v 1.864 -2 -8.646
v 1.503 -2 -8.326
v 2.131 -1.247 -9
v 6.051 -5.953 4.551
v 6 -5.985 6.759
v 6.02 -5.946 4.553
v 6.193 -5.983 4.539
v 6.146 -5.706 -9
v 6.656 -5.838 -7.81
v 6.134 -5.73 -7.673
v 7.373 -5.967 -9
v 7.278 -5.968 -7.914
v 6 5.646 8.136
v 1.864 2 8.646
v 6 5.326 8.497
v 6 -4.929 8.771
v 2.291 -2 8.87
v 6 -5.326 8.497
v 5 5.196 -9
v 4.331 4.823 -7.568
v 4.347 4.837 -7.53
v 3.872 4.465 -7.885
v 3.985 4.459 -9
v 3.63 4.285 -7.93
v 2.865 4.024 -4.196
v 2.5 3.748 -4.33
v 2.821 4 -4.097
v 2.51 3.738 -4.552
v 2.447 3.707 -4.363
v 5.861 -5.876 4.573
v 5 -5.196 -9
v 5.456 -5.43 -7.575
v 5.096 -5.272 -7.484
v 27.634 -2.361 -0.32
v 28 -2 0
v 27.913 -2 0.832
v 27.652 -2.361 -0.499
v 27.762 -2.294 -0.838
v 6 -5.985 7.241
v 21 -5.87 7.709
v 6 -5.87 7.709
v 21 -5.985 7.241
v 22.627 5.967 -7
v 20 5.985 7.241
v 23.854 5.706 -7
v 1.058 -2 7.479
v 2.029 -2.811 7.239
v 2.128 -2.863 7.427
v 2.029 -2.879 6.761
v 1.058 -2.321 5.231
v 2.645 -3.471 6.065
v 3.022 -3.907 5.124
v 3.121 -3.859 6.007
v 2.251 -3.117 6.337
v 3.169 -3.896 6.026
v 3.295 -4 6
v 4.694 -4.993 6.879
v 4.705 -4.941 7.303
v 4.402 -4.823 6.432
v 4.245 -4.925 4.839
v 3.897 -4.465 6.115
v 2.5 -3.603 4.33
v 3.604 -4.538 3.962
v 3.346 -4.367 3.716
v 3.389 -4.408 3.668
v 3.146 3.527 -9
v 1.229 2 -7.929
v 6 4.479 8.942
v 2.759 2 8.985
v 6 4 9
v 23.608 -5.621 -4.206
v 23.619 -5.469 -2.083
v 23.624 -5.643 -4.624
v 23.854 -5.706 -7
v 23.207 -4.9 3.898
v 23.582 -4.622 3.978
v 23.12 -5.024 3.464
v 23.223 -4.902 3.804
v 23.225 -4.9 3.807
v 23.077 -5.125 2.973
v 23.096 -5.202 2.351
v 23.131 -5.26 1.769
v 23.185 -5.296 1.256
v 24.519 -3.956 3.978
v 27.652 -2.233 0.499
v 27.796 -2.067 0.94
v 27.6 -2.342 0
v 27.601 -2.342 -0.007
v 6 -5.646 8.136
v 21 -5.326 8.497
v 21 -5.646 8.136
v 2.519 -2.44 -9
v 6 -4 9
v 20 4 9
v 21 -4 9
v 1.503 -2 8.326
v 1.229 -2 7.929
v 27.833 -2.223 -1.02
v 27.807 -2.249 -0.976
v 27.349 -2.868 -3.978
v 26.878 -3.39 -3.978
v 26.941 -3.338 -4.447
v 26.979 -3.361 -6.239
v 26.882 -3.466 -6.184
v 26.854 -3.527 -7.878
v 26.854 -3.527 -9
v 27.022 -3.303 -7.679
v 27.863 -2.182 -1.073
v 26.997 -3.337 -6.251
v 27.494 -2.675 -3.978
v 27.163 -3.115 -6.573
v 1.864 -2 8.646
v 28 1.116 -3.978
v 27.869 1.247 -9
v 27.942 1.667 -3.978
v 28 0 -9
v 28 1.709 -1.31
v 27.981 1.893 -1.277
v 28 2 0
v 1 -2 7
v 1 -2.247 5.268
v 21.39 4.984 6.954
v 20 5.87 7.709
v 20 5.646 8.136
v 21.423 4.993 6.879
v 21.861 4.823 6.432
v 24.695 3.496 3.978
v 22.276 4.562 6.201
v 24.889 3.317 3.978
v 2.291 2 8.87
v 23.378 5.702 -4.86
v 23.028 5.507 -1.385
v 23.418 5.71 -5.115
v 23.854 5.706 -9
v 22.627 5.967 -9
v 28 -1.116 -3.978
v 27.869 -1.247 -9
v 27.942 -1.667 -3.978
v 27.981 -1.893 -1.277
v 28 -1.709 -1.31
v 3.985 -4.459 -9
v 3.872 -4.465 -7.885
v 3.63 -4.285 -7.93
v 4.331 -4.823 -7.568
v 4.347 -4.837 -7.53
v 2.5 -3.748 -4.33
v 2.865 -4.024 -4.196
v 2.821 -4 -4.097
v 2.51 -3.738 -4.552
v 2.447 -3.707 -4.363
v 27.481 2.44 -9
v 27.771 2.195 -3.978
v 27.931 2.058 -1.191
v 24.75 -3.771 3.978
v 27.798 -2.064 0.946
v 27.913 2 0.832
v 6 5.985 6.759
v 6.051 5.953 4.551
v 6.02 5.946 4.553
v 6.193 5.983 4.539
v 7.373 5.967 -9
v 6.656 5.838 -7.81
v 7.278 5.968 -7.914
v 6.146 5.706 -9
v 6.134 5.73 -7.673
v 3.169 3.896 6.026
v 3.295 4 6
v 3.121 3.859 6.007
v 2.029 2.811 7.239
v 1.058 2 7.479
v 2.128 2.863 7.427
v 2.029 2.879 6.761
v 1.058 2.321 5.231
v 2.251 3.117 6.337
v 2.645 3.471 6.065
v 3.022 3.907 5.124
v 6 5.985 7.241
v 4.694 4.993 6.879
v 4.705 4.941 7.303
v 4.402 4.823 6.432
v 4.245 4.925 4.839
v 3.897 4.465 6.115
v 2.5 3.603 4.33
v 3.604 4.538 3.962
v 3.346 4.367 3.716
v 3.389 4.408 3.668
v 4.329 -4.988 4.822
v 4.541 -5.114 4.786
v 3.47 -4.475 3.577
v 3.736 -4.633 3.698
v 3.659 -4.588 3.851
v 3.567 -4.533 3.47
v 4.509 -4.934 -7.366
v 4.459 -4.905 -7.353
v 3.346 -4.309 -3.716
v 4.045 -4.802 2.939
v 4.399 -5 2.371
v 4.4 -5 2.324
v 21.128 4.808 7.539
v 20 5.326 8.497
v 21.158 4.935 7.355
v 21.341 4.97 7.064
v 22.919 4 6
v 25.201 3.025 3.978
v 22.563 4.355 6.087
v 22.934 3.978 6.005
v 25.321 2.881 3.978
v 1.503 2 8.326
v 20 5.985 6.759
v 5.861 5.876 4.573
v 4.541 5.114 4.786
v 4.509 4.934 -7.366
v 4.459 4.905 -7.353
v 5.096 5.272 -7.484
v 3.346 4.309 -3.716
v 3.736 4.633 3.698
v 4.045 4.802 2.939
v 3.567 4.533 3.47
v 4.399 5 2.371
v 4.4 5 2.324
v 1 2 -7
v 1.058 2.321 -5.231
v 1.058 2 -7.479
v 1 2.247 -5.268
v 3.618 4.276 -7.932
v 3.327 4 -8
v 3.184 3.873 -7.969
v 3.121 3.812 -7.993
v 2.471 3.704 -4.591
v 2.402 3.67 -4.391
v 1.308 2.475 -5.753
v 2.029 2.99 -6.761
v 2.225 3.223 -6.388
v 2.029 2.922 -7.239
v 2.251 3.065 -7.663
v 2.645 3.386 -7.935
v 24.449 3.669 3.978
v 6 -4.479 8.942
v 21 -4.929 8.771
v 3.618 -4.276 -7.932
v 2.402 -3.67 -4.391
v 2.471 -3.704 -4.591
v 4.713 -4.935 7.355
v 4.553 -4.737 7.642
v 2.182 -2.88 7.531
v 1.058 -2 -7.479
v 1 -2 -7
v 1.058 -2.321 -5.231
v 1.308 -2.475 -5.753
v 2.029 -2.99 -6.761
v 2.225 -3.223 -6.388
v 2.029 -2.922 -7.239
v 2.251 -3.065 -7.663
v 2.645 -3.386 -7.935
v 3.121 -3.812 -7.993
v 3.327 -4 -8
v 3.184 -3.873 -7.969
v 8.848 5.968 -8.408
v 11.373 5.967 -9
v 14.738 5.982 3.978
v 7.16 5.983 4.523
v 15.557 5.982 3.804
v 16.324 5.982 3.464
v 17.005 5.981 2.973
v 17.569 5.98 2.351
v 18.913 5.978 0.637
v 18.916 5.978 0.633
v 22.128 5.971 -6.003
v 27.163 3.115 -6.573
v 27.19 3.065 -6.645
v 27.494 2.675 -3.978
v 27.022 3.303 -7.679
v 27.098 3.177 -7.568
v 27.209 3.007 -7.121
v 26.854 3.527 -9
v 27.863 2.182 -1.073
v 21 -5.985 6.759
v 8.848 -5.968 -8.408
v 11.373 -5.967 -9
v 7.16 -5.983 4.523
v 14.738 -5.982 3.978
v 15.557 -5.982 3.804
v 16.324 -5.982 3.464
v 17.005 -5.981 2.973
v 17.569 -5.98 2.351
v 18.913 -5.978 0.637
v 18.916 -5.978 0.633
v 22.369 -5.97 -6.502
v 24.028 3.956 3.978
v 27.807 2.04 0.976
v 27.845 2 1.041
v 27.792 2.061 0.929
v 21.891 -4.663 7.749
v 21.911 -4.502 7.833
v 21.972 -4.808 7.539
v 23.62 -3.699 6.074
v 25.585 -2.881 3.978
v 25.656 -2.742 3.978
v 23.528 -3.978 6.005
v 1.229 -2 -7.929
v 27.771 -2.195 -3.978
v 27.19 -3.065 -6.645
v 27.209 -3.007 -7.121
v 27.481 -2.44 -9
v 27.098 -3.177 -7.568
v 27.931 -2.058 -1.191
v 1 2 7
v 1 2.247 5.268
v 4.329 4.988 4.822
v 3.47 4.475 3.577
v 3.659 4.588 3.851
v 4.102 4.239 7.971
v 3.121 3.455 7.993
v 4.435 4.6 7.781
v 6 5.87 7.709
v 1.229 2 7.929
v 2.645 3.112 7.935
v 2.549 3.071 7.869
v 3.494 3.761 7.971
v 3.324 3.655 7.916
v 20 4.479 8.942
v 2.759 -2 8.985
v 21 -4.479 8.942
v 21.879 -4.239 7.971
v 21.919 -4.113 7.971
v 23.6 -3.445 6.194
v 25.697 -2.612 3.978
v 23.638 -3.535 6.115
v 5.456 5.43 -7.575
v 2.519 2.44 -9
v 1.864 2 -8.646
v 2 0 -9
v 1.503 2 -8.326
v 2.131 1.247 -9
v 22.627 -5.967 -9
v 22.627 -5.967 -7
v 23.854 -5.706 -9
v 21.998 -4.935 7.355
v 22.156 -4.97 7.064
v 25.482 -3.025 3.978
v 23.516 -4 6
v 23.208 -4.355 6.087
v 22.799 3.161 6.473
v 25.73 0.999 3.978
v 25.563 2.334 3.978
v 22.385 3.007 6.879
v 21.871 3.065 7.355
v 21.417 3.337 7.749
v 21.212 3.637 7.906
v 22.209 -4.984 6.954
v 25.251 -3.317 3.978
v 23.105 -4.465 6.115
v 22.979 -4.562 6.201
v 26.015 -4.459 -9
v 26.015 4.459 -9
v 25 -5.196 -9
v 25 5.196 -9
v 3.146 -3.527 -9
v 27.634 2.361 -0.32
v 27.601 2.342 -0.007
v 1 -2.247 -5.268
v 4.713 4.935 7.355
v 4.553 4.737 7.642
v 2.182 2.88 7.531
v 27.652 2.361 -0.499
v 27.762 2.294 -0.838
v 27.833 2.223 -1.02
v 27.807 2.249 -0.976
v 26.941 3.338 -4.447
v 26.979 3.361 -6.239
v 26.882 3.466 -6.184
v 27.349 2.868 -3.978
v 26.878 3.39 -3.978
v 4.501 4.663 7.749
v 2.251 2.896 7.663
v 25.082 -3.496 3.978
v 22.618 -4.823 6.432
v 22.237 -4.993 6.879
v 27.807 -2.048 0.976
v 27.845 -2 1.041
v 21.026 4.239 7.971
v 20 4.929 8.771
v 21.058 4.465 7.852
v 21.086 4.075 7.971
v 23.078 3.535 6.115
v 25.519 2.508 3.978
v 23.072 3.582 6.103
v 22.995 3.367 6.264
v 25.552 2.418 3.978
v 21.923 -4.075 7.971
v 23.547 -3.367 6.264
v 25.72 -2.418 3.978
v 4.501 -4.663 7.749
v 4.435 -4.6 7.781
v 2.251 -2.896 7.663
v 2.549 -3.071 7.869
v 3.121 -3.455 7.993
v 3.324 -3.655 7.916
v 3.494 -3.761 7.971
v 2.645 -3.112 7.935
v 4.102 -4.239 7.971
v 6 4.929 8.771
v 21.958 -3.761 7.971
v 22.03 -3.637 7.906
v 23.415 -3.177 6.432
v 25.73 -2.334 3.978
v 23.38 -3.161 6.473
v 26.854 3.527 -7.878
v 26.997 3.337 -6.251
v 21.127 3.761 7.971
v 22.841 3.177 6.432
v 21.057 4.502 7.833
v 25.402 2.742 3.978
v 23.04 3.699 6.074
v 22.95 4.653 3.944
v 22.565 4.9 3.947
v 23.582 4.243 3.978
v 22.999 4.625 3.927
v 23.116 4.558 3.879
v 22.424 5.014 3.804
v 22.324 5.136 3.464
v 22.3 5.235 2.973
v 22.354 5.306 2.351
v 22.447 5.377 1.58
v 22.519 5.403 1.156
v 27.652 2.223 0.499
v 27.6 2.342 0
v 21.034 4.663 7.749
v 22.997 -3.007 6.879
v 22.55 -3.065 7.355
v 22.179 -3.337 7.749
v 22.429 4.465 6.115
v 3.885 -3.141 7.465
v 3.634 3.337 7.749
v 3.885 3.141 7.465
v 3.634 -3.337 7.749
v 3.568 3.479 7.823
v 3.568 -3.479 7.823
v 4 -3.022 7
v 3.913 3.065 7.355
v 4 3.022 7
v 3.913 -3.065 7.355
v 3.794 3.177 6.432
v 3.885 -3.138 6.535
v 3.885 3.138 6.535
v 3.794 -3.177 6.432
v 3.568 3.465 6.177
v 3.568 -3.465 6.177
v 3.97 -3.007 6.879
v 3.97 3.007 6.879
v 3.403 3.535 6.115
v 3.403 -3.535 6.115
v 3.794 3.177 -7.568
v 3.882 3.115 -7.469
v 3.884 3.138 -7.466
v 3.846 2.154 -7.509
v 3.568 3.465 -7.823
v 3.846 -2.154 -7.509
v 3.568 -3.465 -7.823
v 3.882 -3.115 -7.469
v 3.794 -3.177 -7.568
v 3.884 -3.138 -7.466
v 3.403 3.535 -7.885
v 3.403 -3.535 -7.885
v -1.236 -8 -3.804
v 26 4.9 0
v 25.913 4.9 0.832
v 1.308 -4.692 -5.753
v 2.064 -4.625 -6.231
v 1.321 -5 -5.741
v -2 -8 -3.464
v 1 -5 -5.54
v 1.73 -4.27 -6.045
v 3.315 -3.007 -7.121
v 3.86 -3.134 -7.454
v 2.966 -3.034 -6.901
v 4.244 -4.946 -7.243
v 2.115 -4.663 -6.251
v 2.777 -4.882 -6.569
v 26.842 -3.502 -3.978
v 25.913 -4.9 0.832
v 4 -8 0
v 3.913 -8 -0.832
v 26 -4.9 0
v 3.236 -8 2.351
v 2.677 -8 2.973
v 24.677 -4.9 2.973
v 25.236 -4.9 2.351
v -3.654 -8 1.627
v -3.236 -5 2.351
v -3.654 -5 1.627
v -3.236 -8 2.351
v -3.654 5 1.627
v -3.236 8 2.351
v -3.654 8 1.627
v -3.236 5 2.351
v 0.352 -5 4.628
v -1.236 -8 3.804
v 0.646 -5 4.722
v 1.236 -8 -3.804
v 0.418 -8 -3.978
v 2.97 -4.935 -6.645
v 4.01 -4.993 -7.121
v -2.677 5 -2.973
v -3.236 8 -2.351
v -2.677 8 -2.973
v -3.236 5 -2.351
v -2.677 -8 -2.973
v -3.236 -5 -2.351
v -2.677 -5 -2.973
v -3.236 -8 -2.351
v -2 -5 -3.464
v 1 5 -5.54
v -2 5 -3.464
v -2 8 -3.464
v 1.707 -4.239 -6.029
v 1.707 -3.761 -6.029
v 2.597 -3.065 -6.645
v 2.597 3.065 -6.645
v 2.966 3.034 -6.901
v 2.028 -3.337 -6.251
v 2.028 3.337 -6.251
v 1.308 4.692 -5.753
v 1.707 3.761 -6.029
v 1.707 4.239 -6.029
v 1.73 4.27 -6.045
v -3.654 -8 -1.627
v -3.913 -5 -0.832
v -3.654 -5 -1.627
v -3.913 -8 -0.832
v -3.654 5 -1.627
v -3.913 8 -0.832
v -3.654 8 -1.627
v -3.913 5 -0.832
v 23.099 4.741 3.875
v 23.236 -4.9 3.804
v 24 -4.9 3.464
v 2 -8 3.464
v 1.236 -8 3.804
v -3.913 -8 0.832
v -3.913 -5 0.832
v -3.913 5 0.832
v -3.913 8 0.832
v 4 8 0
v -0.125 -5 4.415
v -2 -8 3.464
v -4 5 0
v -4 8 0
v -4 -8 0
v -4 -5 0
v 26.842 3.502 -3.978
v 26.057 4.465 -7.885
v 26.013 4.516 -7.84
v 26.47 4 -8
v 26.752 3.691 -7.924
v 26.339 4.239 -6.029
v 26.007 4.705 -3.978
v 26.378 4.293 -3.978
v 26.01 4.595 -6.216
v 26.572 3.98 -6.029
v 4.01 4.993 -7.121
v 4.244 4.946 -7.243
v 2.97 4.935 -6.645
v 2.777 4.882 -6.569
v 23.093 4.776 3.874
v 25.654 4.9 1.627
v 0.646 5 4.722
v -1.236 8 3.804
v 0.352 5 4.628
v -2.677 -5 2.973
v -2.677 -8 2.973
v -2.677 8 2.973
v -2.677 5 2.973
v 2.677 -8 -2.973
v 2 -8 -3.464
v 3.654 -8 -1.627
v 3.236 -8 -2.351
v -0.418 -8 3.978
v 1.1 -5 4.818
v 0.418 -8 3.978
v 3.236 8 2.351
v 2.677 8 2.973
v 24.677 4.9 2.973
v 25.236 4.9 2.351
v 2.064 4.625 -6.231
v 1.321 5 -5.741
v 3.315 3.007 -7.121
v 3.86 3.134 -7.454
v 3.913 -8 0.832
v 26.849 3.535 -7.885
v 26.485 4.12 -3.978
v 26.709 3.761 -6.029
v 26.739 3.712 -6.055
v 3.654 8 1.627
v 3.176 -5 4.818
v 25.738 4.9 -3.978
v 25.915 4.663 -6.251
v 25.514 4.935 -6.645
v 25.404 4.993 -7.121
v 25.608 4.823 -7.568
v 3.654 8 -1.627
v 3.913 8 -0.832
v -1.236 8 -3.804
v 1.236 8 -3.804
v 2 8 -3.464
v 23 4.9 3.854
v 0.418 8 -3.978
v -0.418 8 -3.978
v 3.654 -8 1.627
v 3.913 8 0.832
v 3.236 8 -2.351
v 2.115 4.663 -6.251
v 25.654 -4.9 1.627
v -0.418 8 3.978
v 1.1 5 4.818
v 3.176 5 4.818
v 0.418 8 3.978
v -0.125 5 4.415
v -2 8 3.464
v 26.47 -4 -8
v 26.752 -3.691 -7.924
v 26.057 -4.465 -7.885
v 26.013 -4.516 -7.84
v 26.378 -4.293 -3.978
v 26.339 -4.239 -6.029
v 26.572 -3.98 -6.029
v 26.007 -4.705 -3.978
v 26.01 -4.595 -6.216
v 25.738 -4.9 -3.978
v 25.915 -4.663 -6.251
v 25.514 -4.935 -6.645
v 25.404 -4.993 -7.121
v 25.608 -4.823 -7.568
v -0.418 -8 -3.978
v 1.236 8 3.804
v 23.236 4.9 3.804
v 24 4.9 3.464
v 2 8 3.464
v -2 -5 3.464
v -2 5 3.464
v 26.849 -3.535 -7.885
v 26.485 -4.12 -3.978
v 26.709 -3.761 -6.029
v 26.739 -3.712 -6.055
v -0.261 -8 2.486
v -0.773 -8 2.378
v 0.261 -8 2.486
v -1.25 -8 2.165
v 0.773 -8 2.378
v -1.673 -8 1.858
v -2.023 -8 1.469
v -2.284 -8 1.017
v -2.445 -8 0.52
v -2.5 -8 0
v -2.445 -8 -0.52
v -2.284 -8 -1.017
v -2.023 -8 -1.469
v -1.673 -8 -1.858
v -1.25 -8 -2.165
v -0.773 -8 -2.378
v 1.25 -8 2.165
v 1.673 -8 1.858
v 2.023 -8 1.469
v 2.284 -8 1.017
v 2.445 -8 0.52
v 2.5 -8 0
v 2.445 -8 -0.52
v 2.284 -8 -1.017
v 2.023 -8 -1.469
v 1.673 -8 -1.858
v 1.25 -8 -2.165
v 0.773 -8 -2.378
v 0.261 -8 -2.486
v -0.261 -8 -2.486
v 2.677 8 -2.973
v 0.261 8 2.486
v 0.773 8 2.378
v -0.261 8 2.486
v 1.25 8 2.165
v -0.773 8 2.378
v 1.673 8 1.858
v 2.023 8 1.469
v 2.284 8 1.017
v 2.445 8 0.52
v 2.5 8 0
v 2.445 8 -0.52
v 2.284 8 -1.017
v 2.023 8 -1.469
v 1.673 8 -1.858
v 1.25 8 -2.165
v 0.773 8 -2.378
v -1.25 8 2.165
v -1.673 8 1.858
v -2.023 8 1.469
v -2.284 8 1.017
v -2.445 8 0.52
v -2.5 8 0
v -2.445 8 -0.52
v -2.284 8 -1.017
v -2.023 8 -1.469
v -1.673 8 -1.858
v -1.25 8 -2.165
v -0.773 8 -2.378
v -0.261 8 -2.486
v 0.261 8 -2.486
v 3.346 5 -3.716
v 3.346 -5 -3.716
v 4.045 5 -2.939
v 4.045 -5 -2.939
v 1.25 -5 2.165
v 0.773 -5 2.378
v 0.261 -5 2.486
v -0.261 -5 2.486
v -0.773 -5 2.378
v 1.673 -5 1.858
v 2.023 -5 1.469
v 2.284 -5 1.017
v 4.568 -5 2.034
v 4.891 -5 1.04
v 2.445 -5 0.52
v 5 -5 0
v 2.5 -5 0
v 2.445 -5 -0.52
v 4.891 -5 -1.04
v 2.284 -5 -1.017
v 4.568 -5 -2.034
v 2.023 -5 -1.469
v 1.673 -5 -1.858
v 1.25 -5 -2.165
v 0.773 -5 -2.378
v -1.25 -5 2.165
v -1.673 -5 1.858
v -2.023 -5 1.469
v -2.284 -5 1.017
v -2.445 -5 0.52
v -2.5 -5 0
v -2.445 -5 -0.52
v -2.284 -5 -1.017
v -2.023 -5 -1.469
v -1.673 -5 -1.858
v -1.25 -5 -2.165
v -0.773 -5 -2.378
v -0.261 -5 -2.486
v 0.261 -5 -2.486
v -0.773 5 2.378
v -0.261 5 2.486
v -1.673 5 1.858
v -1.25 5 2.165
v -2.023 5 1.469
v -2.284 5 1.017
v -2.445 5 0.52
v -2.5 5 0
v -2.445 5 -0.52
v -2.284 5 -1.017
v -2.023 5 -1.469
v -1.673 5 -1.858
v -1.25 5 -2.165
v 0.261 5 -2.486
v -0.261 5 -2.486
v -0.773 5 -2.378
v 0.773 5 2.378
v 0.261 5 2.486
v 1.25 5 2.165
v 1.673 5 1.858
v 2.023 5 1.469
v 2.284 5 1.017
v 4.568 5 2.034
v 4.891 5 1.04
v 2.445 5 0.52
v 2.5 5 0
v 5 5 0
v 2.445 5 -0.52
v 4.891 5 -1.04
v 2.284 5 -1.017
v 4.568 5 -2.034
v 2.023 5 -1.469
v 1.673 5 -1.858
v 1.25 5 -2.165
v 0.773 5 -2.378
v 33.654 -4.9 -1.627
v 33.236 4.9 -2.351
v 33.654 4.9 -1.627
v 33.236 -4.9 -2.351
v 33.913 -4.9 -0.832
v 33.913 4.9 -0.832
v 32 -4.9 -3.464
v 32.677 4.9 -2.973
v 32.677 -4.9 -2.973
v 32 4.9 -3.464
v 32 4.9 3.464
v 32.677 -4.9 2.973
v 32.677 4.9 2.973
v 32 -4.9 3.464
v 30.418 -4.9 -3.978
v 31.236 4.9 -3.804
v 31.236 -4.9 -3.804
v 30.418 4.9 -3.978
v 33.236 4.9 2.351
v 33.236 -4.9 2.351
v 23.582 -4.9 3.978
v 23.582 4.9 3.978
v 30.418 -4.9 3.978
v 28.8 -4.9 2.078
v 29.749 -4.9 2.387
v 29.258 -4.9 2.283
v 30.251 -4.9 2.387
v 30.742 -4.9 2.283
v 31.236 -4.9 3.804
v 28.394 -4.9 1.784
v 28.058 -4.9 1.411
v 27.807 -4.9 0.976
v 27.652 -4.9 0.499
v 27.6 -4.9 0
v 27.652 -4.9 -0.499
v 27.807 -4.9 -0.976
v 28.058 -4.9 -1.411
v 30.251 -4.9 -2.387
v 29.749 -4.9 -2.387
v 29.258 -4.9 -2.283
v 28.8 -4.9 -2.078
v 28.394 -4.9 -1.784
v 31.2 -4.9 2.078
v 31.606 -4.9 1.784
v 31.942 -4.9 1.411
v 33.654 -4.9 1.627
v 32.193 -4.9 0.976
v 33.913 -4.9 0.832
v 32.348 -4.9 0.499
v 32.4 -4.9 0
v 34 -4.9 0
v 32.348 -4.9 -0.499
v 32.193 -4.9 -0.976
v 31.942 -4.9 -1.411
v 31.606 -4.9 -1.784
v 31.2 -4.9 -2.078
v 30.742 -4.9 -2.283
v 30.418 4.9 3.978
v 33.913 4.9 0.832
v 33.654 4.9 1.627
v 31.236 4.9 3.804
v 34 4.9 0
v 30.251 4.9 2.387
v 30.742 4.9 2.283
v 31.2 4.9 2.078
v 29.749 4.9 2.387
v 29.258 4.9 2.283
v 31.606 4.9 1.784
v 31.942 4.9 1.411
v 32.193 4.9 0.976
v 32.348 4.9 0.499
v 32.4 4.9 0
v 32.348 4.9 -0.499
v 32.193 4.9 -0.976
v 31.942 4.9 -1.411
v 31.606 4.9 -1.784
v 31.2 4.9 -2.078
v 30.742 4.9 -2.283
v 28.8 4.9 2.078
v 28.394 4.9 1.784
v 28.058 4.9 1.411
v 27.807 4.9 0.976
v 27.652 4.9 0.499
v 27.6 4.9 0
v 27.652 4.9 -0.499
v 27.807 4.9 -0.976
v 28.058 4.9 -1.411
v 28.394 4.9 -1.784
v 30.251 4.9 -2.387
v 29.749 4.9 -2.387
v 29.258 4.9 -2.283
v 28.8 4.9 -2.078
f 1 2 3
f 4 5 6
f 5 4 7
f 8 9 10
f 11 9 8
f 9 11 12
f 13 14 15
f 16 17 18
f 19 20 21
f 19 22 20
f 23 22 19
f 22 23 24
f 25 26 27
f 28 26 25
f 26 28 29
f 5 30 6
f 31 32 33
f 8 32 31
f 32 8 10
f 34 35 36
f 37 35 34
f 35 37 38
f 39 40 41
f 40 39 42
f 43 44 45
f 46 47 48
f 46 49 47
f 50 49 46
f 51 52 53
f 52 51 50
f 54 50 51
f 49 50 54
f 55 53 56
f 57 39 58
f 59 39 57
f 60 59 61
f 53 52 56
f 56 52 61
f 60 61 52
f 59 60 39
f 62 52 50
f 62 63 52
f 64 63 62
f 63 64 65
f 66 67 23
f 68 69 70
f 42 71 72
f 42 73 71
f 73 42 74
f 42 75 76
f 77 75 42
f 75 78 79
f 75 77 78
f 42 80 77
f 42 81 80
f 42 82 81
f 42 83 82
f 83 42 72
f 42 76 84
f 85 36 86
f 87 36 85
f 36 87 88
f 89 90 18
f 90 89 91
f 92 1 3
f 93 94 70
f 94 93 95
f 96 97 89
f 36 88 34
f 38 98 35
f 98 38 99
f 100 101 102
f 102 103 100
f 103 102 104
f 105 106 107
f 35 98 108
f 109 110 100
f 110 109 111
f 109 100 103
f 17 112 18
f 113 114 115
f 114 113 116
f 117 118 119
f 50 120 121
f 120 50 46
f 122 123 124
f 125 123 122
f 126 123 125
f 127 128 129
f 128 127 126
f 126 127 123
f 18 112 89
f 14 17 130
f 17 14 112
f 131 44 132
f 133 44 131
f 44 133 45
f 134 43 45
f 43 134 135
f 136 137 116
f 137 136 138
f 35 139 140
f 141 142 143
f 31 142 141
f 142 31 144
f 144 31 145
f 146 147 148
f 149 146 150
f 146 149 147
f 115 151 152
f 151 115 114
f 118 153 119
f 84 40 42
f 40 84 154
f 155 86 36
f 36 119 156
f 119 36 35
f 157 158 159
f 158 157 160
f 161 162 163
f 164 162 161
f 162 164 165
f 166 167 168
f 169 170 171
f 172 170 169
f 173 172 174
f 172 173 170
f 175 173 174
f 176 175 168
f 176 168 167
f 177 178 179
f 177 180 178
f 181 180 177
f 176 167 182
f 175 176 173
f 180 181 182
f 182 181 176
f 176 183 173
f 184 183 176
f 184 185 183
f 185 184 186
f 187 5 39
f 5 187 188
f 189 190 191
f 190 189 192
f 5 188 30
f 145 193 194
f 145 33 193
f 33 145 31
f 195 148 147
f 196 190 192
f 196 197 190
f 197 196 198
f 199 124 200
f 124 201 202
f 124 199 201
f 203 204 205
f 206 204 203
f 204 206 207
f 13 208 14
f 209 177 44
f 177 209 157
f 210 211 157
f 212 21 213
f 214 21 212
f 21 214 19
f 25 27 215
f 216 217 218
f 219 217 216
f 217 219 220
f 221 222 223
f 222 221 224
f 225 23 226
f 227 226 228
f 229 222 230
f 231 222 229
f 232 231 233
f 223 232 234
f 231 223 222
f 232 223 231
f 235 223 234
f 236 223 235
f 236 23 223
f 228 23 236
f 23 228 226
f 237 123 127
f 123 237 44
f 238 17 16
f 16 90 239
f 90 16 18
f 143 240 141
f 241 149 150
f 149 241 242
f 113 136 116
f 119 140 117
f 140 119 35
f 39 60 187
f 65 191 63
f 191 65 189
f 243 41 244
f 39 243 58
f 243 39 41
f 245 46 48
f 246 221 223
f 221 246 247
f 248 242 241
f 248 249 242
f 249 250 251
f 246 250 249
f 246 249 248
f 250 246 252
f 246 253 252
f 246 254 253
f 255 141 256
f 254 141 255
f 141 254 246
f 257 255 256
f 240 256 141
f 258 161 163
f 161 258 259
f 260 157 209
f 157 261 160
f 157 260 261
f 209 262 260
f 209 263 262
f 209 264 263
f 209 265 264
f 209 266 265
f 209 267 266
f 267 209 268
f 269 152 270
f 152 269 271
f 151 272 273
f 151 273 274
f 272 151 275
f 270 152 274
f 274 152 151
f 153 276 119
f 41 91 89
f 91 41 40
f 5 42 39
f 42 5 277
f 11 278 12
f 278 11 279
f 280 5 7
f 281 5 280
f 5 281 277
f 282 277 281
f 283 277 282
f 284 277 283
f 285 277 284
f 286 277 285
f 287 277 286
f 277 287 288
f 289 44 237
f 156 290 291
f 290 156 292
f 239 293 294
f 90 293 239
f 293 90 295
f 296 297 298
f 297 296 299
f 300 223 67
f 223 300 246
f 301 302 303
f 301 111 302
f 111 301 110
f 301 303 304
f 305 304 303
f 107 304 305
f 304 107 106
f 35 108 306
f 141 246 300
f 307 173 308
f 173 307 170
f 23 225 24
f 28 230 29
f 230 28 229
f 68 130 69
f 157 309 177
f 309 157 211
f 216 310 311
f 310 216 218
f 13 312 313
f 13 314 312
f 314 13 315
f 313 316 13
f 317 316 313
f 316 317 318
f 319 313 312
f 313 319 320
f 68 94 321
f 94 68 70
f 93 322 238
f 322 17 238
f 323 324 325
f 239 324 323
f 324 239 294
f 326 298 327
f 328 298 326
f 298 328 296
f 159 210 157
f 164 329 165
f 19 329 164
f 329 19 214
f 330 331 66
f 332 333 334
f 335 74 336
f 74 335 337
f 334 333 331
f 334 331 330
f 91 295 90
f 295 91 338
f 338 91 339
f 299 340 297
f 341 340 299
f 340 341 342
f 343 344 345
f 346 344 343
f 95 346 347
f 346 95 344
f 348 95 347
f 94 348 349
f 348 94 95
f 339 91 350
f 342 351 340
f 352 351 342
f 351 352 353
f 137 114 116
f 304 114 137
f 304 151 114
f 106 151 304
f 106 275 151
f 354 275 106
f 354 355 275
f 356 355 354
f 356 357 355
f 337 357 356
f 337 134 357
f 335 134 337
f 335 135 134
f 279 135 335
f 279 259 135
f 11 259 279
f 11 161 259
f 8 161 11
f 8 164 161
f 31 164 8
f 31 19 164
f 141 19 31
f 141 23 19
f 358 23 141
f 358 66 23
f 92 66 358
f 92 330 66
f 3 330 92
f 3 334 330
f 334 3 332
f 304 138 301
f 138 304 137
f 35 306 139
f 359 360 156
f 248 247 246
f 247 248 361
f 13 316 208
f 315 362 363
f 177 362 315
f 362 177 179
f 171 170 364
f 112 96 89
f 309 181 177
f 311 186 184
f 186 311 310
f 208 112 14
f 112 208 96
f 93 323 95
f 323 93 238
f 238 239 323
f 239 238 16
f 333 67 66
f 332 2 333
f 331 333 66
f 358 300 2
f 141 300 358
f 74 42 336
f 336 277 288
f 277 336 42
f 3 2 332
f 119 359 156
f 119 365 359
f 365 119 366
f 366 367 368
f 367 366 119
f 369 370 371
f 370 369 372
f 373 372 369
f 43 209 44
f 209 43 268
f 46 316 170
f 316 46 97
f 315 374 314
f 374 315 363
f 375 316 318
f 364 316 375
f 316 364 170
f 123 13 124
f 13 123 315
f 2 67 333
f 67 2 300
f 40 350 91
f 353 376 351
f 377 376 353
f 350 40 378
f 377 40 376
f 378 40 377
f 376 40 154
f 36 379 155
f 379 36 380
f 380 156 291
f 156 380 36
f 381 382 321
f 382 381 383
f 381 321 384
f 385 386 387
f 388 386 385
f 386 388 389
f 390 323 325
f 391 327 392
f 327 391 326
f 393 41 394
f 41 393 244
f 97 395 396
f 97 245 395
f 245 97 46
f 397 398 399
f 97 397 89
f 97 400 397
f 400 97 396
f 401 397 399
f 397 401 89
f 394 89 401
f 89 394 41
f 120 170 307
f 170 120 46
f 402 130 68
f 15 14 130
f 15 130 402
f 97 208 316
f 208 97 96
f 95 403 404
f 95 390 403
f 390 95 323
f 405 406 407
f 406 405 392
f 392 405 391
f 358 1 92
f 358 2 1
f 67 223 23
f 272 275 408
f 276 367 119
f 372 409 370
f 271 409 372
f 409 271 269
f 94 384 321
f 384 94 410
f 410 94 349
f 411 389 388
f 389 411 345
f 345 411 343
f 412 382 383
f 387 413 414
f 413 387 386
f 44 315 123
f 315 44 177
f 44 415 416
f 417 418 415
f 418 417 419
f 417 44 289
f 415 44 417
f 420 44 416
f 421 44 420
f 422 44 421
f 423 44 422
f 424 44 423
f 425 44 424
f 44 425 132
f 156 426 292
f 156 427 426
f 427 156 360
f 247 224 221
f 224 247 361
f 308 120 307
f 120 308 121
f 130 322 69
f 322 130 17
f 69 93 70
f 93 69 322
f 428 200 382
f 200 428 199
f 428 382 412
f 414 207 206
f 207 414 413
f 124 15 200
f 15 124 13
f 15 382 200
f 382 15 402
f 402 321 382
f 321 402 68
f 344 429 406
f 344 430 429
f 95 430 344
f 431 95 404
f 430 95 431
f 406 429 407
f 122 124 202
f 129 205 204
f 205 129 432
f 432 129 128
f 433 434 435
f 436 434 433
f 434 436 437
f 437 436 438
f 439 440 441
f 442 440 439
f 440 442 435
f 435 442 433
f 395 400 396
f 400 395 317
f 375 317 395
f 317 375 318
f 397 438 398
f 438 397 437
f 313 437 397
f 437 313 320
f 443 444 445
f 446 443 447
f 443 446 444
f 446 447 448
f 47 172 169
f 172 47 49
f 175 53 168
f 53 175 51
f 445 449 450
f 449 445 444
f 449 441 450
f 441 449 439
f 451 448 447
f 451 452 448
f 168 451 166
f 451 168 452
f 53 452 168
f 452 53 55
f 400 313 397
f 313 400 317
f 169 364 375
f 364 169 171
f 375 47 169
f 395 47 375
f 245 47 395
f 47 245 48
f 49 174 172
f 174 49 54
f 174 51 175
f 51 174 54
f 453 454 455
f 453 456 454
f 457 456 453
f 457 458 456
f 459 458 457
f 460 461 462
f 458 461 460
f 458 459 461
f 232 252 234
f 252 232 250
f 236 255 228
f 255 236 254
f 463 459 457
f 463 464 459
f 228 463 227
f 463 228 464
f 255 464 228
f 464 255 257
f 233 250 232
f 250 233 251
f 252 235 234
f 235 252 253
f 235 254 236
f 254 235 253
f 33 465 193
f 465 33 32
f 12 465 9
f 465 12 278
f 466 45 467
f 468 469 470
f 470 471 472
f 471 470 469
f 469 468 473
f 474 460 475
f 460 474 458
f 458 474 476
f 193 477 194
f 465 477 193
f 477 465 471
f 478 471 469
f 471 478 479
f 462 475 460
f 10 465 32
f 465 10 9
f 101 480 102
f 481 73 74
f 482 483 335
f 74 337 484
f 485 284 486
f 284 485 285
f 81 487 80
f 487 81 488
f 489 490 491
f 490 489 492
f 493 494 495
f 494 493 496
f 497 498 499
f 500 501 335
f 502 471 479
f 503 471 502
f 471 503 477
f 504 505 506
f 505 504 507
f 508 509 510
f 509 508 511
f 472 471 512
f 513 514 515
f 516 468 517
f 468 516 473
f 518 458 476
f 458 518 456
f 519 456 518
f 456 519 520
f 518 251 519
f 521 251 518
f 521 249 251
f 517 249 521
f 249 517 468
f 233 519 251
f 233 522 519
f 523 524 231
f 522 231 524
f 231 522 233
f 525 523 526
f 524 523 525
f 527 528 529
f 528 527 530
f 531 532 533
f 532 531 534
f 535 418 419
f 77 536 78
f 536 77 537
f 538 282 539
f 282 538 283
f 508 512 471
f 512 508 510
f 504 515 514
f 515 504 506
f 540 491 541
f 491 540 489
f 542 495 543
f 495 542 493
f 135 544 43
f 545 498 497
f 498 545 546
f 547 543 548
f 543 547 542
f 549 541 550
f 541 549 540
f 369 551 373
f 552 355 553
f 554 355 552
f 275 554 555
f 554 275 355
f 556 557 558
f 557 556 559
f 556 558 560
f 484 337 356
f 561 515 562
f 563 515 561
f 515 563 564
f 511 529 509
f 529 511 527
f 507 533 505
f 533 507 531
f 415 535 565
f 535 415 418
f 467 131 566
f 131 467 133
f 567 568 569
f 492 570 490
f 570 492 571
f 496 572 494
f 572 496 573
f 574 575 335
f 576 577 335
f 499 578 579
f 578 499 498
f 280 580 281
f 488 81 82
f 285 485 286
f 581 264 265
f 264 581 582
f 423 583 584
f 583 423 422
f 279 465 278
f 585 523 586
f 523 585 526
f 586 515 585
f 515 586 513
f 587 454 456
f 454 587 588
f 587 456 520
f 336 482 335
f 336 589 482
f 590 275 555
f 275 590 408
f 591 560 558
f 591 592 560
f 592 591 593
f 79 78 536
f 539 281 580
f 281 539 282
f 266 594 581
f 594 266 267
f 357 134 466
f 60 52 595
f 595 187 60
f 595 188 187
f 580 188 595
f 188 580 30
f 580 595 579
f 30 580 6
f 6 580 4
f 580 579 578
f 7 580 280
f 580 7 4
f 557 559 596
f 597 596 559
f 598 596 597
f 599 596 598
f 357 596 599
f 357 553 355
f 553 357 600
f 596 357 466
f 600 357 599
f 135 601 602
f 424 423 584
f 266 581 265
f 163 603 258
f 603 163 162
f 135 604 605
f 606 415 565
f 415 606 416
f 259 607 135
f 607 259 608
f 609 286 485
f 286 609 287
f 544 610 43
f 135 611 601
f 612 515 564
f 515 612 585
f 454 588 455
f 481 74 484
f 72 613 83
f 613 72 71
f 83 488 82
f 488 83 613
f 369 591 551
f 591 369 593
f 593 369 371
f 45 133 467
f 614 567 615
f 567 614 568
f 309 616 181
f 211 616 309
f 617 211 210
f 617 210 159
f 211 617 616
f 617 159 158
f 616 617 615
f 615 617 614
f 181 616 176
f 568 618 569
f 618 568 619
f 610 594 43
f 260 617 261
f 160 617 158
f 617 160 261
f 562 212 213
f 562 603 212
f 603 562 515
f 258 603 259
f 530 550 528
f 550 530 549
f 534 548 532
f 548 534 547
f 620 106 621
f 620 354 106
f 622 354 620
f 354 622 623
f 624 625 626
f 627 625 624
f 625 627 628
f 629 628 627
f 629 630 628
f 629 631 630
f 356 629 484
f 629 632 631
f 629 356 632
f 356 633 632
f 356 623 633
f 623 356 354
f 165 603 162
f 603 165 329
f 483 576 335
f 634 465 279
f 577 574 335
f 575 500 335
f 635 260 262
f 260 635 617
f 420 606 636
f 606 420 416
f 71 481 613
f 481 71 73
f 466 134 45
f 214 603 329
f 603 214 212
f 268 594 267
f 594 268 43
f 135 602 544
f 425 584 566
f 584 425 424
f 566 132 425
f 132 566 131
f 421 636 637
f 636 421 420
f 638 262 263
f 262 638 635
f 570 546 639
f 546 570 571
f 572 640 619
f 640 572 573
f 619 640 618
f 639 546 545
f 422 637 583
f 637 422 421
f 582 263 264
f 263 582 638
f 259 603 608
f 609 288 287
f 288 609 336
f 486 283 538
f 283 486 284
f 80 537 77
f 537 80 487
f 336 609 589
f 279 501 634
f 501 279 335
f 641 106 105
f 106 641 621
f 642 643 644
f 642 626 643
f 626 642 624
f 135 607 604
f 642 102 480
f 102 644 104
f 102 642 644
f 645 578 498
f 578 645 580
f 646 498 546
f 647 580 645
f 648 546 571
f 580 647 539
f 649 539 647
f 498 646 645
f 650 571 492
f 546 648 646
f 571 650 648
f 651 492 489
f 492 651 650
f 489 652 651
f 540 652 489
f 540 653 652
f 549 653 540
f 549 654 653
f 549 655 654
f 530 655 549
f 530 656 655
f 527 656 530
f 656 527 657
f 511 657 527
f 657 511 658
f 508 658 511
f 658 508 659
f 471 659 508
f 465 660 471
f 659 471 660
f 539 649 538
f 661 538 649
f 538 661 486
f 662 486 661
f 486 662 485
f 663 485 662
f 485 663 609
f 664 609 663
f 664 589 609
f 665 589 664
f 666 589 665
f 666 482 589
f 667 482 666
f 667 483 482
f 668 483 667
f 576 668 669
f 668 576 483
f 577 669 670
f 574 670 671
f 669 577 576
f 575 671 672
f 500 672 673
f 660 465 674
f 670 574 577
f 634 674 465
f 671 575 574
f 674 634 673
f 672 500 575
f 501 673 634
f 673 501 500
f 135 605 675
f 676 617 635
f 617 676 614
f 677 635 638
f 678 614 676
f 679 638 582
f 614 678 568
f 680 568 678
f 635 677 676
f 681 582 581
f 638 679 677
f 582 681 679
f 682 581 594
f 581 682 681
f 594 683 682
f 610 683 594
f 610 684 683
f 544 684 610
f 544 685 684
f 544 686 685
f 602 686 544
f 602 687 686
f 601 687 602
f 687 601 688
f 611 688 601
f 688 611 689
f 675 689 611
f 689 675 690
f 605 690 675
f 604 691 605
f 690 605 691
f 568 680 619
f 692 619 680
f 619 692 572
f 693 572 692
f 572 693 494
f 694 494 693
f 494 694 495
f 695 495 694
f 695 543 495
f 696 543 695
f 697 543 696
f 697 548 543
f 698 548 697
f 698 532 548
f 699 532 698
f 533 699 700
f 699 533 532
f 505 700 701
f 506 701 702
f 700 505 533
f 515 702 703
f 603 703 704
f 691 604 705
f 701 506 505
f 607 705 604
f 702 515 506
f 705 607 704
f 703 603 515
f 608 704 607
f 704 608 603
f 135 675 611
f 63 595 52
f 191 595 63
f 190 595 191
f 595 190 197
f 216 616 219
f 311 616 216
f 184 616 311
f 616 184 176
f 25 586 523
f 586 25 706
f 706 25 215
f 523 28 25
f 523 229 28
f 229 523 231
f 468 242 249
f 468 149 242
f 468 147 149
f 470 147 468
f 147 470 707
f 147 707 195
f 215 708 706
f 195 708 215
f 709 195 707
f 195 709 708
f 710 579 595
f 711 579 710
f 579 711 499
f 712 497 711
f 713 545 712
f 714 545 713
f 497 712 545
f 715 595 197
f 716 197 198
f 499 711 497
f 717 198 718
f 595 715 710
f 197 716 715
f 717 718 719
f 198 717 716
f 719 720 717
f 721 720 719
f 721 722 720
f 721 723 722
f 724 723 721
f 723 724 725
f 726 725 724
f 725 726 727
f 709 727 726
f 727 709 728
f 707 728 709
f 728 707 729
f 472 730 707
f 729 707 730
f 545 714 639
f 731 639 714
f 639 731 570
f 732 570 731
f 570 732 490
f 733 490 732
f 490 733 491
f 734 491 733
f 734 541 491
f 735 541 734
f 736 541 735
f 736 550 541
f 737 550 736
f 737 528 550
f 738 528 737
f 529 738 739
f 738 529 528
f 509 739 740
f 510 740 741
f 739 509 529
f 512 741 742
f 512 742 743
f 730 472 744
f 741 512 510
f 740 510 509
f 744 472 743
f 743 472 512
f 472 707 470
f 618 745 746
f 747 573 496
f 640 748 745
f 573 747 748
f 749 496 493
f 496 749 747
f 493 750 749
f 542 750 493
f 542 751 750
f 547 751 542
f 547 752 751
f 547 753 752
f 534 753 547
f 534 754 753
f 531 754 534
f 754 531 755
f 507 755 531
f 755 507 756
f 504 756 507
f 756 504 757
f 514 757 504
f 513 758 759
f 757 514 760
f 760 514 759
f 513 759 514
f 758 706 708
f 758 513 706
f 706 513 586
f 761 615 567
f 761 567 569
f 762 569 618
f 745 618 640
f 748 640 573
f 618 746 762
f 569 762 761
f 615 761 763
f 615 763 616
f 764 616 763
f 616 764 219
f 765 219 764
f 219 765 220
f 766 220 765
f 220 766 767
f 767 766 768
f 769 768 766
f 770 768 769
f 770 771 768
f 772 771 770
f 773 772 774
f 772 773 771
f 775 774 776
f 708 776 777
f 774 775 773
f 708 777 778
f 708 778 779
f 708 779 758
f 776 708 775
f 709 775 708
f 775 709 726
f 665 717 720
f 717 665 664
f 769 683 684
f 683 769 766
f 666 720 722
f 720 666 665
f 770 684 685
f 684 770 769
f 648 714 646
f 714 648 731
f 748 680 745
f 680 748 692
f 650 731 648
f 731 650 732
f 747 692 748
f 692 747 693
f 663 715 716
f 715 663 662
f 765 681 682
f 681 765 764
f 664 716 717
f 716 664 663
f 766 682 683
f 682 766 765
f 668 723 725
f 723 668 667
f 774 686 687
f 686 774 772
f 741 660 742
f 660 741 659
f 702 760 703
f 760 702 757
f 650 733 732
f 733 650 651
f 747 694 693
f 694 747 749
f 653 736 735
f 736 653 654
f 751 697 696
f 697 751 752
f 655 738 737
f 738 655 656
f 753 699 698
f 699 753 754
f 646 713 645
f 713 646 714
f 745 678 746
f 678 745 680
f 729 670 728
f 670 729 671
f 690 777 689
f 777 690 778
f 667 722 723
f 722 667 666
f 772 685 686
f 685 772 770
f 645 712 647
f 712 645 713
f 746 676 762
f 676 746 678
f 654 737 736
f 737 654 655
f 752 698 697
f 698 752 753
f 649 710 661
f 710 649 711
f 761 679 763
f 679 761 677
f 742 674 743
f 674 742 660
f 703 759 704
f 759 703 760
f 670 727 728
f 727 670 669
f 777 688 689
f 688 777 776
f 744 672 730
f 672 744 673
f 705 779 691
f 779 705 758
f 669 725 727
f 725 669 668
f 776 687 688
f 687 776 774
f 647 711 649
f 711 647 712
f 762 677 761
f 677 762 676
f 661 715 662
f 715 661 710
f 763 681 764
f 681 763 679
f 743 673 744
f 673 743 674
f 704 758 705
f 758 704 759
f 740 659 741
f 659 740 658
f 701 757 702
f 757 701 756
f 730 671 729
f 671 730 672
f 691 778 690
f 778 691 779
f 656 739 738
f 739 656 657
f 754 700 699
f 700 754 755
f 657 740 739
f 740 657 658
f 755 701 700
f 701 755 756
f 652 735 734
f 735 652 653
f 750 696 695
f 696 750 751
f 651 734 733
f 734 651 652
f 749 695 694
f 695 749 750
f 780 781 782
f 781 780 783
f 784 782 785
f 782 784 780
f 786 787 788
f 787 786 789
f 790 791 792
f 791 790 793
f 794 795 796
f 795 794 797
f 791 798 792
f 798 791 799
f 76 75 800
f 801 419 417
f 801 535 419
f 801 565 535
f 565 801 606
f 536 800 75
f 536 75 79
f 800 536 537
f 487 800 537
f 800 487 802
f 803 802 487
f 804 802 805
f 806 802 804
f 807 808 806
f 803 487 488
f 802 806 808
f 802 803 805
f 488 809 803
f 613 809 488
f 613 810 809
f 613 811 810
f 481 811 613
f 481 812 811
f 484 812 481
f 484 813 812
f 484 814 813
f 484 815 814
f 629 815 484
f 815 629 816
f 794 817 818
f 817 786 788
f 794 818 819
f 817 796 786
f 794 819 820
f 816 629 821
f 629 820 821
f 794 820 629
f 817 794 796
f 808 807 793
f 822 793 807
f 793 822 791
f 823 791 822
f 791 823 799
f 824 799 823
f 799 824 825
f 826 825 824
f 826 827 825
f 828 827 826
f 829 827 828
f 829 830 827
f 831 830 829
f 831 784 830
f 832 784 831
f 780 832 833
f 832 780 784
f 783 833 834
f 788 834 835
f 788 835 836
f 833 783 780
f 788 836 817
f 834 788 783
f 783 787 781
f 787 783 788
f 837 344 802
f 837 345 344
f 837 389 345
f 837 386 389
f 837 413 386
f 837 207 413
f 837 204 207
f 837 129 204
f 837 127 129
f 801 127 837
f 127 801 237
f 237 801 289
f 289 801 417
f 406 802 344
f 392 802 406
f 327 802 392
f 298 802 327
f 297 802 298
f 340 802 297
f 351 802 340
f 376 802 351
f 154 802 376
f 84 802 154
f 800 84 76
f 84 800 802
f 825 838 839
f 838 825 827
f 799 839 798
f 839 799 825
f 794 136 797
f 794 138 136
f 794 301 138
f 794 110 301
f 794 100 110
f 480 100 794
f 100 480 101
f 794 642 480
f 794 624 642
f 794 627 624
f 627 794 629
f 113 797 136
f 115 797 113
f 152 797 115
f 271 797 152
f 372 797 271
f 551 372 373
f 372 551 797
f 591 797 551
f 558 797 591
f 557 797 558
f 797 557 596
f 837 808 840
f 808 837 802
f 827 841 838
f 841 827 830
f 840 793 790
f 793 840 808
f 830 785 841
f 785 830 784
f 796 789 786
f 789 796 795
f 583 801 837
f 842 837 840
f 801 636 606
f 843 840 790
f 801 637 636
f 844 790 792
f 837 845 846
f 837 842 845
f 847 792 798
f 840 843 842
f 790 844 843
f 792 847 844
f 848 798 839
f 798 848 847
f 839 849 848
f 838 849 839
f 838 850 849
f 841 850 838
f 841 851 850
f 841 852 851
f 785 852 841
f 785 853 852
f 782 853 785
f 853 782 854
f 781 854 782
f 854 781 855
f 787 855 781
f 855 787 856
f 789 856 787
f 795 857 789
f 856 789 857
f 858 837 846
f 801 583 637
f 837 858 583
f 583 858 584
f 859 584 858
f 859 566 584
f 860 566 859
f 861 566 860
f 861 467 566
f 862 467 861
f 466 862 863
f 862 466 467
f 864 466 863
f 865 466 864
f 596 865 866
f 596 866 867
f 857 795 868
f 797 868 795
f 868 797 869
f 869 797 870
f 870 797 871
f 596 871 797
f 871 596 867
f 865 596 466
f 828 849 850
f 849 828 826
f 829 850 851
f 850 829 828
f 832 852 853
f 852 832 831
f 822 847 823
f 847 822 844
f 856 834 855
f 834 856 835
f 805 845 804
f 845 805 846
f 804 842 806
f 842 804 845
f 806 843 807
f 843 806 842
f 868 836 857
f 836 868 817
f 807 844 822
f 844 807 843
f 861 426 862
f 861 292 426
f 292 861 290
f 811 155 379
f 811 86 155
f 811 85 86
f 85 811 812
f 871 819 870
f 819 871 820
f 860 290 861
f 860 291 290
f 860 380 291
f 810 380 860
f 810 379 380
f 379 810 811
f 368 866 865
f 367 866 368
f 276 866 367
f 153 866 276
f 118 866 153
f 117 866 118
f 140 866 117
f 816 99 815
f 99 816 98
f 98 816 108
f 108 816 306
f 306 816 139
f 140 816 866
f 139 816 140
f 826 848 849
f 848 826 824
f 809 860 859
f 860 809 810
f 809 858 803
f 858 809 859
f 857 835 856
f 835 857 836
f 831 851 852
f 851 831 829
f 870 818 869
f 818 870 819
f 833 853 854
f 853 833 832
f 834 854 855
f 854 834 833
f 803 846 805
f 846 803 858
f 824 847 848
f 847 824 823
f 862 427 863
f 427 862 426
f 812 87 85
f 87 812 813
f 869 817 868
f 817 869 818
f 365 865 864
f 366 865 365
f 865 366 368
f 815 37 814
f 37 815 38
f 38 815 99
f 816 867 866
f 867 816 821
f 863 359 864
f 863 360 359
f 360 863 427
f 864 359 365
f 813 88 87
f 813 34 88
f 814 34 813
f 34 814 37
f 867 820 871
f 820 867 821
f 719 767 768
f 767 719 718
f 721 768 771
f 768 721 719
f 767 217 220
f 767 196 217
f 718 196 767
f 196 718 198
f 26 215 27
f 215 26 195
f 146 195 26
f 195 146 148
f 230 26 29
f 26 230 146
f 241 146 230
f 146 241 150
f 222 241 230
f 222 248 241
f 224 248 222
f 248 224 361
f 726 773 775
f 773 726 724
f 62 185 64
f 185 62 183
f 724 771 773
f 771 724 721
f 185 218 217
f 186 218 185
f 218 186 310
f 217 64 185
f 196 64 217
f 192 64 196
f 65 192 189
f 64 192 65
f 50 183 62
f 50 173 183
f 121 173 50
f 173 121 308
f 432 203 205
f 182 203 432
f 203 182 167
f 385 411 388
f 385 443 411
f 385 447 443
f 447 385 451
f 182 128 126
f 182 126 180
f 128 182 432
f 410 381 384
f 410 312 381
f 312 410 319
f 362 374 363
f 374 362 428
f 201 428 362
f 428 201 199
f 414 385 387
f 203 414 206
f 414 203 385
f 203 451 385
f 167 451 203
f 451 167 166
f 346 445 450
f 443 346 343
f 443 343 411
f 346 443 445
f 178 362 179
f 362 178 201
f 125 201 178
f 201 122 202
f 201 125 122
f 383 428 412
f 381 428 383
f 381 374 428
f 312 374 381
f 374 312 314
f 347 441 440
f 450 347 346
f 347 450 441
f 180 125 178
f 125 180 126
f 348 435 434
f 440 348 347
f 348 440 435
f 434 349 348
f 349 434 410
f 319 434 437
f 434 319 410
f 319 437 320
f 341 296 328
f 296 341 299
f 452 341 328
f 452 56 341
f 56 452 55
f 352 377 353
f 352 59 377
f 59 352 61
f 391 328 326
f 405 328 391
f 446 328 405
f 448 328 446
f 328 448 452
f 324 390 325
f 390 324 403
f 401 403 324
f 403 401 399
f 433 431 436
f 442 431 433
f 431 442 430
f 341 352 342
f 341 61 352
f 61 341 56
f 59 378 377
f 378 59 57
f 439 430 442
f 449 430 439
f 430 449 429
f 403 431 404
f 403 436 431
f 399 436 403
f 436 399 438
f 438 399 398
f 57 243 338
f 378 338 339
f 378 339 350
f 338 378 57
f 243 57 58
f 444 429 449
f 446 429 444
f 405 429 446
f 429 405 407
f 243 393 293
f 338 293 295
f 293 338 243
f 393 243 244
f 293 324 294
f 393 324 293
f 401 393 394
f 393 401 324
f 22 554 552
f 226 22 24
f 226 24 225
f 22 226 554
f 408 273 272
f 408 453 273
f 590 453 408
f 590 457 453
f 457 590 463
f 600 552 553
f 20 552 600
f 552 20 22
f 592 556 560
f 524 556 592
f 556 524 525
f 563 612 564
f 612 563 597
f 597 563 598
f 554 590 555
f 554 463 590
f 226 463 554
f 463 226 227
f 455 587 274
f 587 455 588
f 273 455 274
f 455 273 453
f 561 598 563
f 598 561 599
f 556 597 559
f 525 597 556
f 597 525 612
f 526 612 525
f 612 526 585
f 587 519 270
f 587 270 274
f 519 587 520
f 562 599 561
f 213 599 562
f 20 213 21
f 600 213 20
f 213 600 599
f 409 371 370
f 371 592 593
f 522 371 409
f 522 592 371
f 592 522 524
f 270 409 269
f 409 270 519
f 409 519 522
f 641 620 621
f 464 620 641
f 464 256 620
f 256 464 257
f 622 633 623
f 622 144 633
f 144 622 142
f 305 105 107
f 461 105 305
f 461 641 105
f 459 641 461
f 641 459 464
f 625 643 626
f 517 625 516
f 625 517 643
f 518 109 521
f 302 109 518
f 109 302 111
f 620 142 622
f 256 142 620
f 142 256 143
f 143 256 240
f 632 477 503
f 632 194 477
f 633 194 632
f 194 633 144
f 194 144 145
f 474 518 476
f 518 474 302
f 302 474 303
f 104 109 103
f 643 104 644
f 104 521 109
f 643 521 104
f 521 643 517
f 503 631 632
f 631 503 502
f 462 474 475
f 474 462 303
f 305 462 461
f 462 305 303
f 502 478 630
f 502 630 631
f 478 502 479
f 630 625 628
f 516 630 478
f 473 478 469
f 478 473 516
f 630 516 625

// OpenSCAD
// file: ../modules/foot-common-parts.scad
module jointUpper() {
    difference() {
        hull() {
            children();
            rotate([90,0,0])
            translate([0,0,-8])
            cylinder(r=4,h=16); 
        }
         hull(){
            rotate([90,0,0]) {
                translate([0,0,-5])
                cylinder(h=10,r=5);
                translate([-5,10,-5])
                cylinder(h=10,r=5);

                translate([-5,-5,-5])
                cylinder(h=10,r=5);

            }
        }
        rotate([90,0,0])
        translate([0,0,-10]){
            cylinder(h=20,r=2.5);
        }
    }
}

module jointLower(x) {
    difference() {
    hull() {
                rotate([90,0,0])
                translate([x,0,-4.9])
                cylinder(h=9.8,r=4);
                
                rotate([90,0,0])
                translate([x-6,0,-4.9])
                cylinder(h=9.8,r=4);
                
                
            }
            rotate([90,0,0])
            translate([x,0,-8])
            cylinder(h=16,r=2.4);
        }
}

//creates a cylinder from [x1,y1,z1] to [x2,y2,z2] with radius r
module pointCylinder(x1,y1,z1,x2,y2,z2,r, extend=false) {
    x= x2-x1;
    y= y2-y1;
    z= z2-z1;
    
    x_vect = [y,-x,0]; // = cross([x,y,z],[0,0,1])

    y_vect = cross([x,y,z],x_vect);

    m = [
    [y/norm(x_vect),y_vect[0]/norm(y_vect),x,x1],
    [-x/norm(x_vect),y_vect[1]/ norm(y_vect),y,y1],
    [0,y_vect[2]/ norm(y_vect),z,z1],
    [0,0,0,1]
    ];

    multmatrix(m)
    if (extend){
        translate([0,0,-1])
        cylinder(r=r,h=3);
        }
    else 
    {cylinder(r=r,h=1);}
}

 module offset_3d(r=1, size=1000) {
     n = $fn==undef ? 12: $fn;
     if(r==0) children();
     else 
         if( r>0 )
             minkowski(convexity=5){
                 children();
                 sphere(r, $fn=n);
             }
         else {
             size2 = size*[1,1,1];// this will form the positv
             size1 = size2*2;    // this will hold a negative inside
             difference(){
                 cube(size2, center=true);// forms the positiv by substracting the negative
                 minkowski(convexity=5){
                     difference(){
                         cube(size1, center=true);
                         children();
                     }
                     sphere(-r, $fn=n);
                 }
             }
         }
 }

module tendonTube (x1,y1,z1,x2,y2,z2,smooth=true) {
    difference() {
        
            hull() {
            pointCylinder(x1,y1,z1,x2,y2,z2,2);
            children();
            
            }
            if (smooth) {
                difference() {
                    pointCylinder(x1,y1,z1,x2,y2,z2,1.5, true);
                    offset_3d(0.5)
                    offset_3d(-0.5)
                    difference(){
                        hull(){
                            pointCylinder(x1,y1,z1,x2,y2,z2,2);
                            children();
                        }
                        pointCylinder(x1,y1,z1,x2,y2,z2,1, true);
                    }    
               }
           }
           else {
               pointCylinder(x1,y1,z1,x2,y2,z2,1, true);
           }
        }
    }
    
module tendonAttachments (x1,z1,x2,z2) {
    difference() {
        hull() {
            children();
            translate([x1,0,z1])
            rotate([90,0,0])
            translate([0,0,-2])
            cylinder(r=2,h=4); 
            translate([x2,0,z2])
            rotate([90,0,0])
            translate([0,0,-2])
            cylinder(r=2,h=4);            
        }
        translate([x1,0,z1])
        rotate([90,0,0])
        translate([0,0,-10])
        cylinder(h=20,r=1);
        
        translate([x2,0,z2])
        rotate([90,0,0])
        translate([0,0,-10])
        cylinder(h=20,r=1);
    }
}
// main file
$fs = 0.5;
//use <phalanx2.scad>
use <../modules/foot-common-parts.scad>

module phalanx1() {
    difference() {
        union() {
            tendonAttachments(3,7,3,-7) {
                translate([15,0,0])
                rotate([90,0,0])
                translate([0,0,-3])
                cylinder(r=2,h=6);
                
                translate([3,0,0])
                rotate([90,0,0])
                translate([0,0,-3])
                cylinder(r=2,h=6);
                
                translate([8,0,-9])
                cylinder(r=6,h=2);
                
                translate([22,0,-9])
                cylinder(r=6,h=2);
                
                rotate([90,0,0])
                translate([24,0,-2])
                cylinder(h=4,r=4);
                
                translate([6,4,7])
                rotate([0,90,0])
                cylinder(h=14,r=2);
                translate([6,-4,7])
                rotate([0,90,0])
                cylinder(h=15,r=2);
            }
            jointUpper() {
                translate([3,0,0])
                rotate([0,90,0])
                cylinder(r=6,h=16);                    
                
                translate([12,0,-9])
                cylinder(r=6,h=2);
                
                translate([22,0,-9])
                cylinder(r=6,h=2);
                
                rotate([90,0,0])
                translate([22,0,-4.9])
                cylinder(h=9.8,r=4);
                
            }
            jointLower(30);
            
            translate([6,4,7])
            rotate([0,90,0])
            cylinder(h=14,r=2);
            translate([6,-4,7])
            rotate([0,90,0])
            cylinder(h=15,r=2);
        }
        
        hull(){
            rotate([90,0,0]) {
                translate([0,0,-5])
                cylinder(h=10,r=5);
                translate([-8,5,-5])
                cylinder(h=10,r=5);

                translate([-8,-5,-5])
                cylinder(h=10,r=5);
            }
        }
        
        translate([0,4,7])
        rotate([0,90,0])
        cylinder(h=40,r=1);
        translate([0,-4,7])
        rotate([0,90,0])
        cylinder(h=40,r=1);
        
        translate([0,4,-7])
        rotate([0,90,0])
        cylinder(h=40,r=1);
        translate([0,-4,-7])
        rotate([0,90,0])
        cylinder(h=40,r=1);
    }
}

phalanx1();

//translate([30,0,0])
//phalanx2();
